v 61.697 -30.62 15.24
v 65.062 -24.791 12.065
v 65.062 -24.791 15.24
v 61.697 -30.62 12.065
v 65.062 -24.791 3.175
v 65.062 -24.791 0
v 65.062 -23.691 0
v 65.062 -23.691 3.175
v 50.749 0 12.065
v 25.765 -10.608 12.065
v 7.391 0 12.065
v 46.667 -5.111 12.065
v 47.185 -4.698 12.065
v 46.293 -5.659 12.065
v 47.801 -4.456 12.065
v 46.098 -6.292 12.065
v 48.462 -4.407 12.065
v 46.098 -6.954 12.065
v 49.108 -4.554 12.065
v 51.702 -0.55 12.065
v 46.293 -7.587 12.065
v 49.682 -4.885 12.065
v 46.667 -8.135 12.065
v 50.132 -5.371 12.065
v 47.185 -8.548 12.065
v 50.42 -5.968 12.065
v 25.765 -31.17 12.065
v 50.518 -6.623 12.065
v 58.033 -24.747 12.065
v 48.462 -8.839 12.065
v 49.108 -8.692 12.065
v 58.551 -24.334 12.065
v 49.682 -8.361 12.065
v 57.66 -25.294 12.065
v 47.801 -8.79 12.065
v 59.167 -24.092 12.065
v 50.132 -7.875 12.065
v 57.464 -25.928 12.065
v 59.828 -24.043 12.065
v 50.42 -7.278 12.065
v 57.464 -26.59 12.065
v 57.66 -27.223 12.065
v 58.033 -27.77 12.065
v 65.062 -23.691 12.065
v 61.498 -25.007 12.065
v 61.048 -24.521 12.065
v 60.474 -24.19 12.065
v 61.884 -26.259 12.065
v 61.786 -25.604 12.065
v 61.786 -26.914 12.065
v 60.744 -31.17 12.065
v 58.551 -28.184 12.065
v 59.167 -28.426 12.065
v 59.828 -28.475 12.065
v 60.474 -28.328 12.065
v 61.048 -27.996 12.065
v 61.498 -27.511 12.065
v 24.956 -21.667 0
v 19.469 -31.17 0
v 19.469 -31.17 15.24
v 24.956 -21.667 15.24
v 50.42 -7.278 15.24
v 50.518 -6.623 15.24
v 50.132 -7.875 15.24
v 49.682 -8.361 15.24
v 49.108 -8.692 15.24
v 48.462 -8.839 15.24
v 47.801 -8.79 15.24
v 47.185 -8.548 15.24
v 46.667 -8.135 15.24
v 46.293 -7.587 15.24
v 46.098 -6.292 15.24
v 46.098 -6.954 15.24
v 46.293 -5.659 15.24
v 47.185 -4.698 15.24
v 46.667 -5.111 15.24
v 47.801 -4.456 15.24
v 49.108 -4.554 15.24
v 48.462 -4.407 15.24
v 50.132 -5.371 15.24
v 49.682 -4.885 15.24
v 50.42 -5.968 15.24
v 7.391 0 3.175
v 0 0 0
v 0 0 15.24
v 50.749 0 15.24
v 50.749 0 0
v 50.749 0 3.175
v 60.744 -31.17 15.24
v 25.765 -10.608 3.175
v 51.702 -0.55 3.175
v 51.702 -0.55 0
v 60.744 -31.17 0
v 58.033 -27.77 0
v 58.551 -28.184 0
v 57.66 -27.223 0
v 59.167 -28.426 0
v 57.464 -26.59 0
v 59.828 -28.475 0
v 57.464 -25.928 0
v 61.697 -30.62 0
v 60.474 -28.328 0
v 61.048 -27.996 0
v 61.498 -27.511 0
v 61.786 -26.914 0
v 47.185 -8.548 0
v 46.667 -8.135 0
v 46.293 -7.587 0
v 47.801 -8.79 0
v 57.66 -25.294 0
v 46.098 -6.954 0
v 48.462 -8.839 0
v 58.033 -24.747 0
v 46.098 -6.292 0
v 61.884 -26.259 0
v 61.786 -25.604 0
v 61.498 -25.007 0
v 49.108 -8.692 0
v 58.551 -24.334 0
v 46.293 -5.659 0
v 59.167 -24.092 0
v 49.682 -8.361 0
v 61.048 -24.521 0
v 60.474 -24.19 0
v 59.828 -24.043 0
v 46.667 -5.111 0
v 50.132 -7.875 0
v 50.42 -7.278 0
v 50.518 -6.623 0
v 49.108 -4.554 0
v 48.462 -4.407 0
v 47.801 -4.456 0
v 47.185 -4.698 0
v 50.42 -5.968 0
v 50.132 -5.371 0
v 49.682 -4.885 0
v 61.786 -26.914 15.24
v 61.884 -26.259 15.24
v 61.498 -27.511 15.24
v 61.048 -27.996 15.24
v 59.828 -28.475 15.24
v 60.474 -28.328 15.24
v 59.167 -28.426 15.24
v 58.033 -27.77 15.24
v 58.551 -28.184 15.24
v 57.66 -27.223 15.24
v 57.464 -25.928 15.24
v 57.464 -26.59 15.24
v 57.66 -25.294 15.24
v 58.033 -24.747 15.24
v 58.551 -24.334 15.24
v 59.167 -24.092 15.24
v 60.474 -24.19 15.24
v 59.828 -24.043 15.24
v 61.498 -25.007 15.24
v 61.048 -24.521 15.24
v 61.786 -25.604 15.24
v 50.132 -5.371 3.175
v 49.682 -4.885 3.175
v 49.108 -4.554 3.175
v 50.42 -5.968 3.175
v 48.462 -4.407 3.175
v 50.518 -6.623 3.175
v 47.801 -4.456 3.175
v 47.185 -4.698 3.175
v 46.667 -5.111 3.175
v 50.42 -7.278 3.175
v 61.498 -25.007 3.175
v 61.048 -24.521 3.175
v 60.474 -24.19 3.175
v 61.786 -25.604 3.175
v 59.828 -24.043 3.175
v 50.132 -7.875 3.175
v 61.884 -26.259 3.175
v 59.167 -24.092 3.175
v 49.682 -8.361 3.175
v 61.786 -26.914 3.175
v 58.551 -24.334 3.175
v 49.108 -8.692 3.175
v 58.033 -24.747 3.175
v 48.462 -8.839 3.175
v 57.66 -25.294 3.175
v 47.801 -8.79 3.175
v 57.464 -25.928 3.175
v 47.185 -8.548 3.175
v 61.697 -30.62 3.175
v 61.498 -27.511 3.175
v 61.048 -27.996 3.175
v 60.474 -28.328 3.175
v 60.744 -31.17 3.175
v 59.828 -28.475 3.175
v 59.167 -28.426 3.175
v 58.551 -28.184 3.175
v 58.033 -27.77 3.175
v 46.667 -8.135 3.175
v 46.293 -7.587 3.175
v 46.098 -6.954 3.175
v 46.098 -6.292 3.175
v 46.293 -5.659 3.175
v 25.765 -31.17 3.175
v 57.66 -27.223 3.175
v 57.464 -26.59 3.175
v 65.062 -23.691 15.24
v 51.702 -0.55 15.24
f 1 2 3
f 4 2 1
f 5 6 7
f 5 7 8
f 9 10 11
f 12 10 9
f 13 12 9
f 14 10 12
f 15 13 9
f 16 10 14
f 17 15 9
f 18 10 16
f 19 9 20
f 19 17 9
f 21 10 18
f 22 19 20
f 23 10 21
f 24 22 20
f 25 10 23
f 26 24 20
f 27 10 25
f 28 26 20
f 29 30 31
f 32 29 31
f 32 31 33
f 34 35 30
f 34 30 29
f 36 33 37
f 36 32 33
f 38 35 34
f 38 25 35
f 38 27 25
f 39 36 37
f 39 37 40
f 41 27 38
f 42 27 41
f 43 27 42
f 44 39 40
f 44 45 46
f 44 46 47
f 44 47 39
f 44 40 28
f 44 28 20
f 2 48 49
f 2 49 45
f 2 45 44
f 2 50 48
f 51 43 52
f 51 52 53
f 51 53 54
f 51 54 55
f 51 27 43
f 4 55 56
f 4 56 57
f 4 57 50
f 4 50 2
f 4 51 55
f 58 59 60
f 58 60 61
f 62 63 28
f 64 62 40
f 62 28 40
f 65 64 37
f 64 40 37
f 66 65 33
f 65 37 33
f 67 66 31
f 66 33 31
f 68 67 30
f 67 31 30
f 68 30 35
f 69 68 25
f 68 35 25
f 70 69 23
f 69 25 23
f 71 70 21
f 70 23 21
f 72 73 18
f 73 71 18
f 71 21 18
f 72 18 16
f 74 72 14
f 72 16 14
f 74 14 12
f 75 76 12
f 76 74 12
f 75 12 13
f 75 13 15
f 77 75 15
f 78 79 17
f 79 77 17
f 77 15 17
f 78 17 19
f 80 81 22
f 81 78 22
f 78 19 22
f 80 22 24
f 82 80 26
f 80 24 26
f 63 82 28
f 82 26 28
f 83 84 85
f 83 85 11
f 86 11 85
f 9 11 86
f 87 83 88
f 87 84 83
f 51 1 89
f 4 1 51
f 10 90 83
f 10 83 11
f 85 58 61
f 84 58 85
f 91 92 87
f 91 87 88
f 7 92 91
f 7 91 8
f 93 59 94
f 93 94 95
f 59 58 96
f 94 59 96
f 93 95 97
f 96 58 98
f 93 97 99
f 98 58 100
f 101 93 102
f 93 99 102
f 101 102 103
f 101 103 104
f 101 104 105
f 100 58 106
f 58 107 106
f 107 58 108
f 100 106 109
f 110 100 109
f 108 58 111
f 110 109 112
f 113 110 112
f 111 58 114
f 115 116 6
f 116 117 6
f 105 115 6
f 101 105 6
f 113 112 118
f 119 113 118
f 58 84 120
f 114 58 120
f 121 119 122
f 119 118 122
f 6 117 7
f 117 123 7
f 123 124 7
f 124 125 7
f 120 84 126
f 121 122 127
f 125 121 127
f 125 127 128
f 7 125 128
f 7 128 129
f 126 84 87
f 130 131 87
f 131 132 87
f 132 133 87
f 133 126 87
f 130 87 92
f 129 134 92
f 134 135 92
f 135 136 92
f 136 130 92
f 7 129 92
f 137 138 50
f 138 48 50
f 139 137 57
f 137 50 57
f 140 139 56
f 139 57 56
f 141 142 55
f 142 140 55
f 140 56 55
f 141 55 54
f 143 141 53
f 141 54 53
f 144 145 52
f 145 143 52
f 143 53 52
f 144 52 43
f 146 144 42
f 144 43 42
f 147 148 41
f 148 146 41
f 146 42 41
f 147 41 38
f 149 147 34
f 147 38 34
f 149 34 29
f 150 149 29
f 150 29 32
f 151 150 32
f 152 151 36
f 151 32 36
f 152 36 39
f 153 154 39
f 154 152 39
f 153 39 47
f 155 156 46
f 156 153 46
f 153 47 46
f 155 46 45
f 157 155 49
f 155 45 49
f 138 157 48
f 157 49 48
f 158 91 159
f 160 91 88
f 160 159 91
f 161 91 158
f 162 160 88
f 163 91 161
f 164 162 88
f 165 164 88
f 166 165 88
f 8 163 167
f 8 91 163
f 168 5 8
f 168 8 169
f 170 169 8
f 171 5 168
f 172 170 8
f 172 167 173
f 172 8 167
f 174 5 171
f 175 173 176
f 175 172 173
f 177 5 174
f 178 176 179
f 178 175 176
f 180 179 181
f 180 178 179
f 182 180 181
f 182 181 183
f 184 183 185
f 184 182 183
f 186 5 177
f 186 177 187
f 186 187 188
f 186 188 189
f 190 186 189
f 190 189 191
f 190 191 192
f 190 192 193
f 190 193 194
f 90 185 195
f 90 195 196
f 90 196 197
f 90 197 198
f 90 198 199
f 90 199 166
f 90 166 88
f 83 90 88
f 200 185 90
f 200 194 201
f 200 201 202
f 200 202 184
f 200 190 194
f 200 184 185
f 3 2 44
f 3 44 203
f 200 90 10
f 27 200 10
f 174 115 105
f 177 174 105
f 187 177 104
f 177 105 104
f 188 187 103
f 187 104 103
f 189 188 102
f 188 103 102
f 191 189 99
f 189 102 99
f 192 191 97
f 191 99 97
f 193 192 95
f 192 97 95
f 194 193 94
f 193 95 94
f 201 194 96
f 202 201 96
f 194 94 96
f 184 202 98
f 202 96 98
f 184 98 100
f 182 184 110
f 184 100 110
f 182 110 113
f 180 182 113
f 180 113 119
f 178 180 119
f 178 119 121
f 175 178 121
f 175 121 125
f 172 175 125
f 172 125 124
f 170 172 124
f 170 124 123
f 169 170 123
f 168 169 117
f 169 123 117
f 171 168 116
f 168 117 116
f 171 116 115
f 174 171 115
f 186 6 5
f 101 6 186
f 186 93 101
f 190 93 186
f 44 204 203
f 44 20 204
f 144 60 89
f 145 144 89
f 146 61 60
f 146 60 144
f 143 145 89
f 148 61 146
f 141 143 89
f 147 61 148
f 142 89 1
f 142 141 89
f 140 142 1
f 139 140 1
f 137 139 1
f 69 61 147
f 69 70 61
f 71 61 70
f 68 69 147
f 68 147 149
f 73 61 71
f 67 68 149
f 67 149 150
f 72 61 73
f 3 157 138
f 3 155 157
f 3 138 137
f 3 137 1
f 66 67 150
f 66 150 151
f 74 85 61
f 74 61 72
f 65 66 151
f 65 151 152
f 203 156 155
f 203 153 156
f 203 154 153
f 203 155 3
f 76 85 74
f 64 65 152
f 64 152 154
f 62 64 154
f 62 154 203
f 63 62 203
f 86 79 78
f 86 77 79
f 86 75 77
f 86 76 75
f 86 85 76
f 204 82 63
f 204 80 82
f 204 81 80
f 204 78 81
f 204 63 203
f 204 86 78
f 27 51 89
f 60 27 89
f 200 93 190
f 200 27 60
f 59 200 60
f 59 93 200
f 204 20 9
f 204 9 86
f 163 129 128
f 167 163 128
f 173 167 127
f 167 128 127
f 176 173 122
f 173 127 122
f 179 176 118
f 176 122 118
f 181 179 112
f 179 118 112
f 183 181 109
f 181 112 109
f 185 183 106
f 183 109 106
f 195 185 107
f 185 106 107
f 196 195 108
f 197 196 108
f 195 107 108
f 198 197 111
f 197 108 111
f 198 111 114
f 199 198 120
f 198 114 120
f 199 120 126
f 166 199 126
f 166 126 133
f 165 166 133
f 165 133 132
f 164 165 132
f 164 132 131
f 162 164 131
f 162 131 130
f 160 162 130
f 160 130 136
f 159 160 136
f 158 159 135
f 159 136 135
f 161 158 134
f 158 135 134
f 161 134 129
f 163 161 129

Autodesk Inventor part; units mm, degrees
ref_plane "YZ Plane" through (0, 0, 0) normal (1, 0, 0) x (0, 1, 0)
ref_plane "XZ Plane" through (0, 0, 0) normal (0, 1, 0) x (-1, 0, 0)
ref_plane "XY Plane" through (0, 0, 0) normal (0, 0, 1) x (1, 0, 0)
sketch "Sketch2" plane through (0, 0, 0) normal (0, 0, 1) x (1, 0, 0)
  line L0 (0, 0) -> (51.3842, 0)
  line L1 (51.3842, 0) -> (65.3796, -24.2407)
  line L2 (65.3796, -24.2407) -> (61.3791, -31.1698)
  line L3 (65.3796, -24.2407) -> (73.3806, -24.2407) construction
  line L4 (61.3791, -31.1698) -> (19.4691, -31.1698)
  line L5 (19.4691, -31.1698) -> (24.9555, -21.6671)
  line L6 (19.4691, -31.1698) -> (30.4419, -31.1698) construction
  line L7 (24.9555, -21.6671) -> (0, 0)
  line L8 (51.3842, 0) -> (58.6918, 0) construction
  line L9 (48.8733, -7.5723) -> (70.4506, -7.5723) construction
  circle A0 centre (48.2959, -6.6229) radius 2.2225
  circle A1 centre (59.662, -26.2588) radius 2.2225
  dimension "d0" = 51.3842
  dimension "d1" = 27.9908
  dimension "d2" = 120
  dimension "d3" = 8.001
  dimension "d4" = 120
  dimension "d5" = 41.91
  dimension "d6" = 10.9728
  dimension "d7" = 60
  dimension "d15" = 4.445
  dimension "d16" = 4.445
extrude "Extrusion1" add sketch "Sketch2" along normal blind 15.24
sketch "Sketch3" plane through (65.3796, -24.2407, 15.24) normal (0.866, -0.5, 0) x (0, 0, -1)
  point P0 (15.24, -11.6967)
sketch "Sketch4" plane through (65.3796, -24.2407, 15.24) normal (0.866, -0.5, 0) x (0, 0, -1)
  line L0 (15.24, -8.001) -> (0, -8.001) projected
  line L1 (0, -8.001) -> (3.175, -8.001)
  line L2 (15.24, 0) -> (0, 0) projected
  line L3 (3.175, -8.001) -> (12.065, -8.001)
  line L4 (12.065, -8.001) -> (12.065, 0)
  line L5 (12.065, 0) -> (3.175, 0)
  line L6 (3.175, 0) -> (3.175, -8.001)
  point P0 (15.24, -11.6967)
  point P1 (3.175, 0)
  point P2 (12.065, -8.001)
  dimension "d19" = 3.175
  dimension "d20" = 8.89
sketch "Sketch5" plane through (19.4691, -31.1698, 0) normal (0, -1, 0) x (1, 0, 0)
  point P0 (-19.4691, 0)
extrude "Extrusion2" cut sketch "Sketch4" against normal blind 127
sketch "Sketch6" plane through (19.4691, -31.1698, 0) normal (0, -1, 0) x (1, 0, 0)
  point P0 (-19.4691, 0)
sketch "Sketch7" plane through (19.4691, -31.1698, 0) normal (0, -1, 0) x (1, 0, 0)
  line L0 (0, 0) -> (41.91, 0) projected
  line L1 (41.91, 3.175) -> (41.91, 12.065) projected
  line L2 (41.91, 0) -> (41.91, 3.175)
  line L3 (41.91, 12.065) -> (-12.0777, 12.065) projected
  line L4 (41.91, 3.175) -> (5.08, 3.175)
  line L5 (5.08, 12.065) -> (41.91, 12.065)
  line L6 (41.91, 12.065) -> (41.91, 3.175)
  line L7 (6.7536, 12.065) -> (6.7536, 3.175)
  line L8 (41.91, 3.175) -> (-12.0777, 3.175) projected
  point P0 (-19.4691, 0)
  dimension "d23" = 36.83
extrude "Extrusion3" [suppressed]
sketch "Sketch8" plane through (0, 0, 0) normal (0, 1, 0) x (1, 0, 0)
  line L0 (65.3796, -3.175) -> (23.3934, -3.175) projected
  line L1 (24.5491, -3.175) -> (23.3934, -3.175)
  line L2 (23.3934, -12.065) -> (7.3914, -12.065) projected
  line L3 (24.5491, -3.175) -> (23.3934, -3.175)
  line L4 (23.3934, -3.175) -> (23.3934, -12.065)
  line L5 (23.3934, -12.065) -> (24.5491, -12.065)
  line L6 (24.5491, -12.065) -> (24.5491, -3.175)
  point P0 (0, 0)
extrude "Extrusion4" cut sketch "Sketch8" along normal mid plane 15.24
sketch "Sketch9" plane through (61.3791, -21.9311, 3.175) normal (-1, 0, 0) x (0, 0, 1)
  point P0 (-3.175, 21.9311)
sketch "Sketch10" plane through (65.3796, -24.2407, 12.065) normal (0.866, 0.5, 0) x (0, 0, -1)
  line L0 (8.89, 0) -> (0, 0) projected
  line L1 (8.89, 4.0005) -> (8.89, 8.001) projected
  line L2 (0, 0) -> (8.89, 0)
  line L3 (8.89, 0) -> (8.89, 8.001)
  line L4 (8.89, 8.001) -> (0, 8.001)
  line L5 (0, 8.001) -> (0, 0)
  point P0 (12.065, 53.6829)
extrude "Extrusion5" cut sketch "Sketch10" against normal blind 15.24
sketch "Sketch11" plane through (19.4691, -31.1698, 0) normal (0, -1, 0) x (1, 0, 0)
  line L0 (42.4154, 3.175) -> (37.9704, 3.175) projected
  line L1 (42.4154, 3.175) -> (6.2959, 3.175)
  line L2 (6.2959, 3.175) -> (6.2959, 12.065)
  line L3 (6.2959, 12.065) -> (42.4154, 12.065)
  line L4 (42.4154, 12.065) -> (42.4154, 3.175)
  point P0 (-19.4691, 0)
extrude "Extrusion6" cut sketch "Sketch11" against normal blind 127
sketch "Sketch12" plane through (24.5491, 0, 3.175) normal (-1, 0, 0) x (0, 0, 1)
  point P0 (-3.175, 0)
sketch "Sketch13" plane through (0, 0, 0) normal (0, 1, 0) x (1, 0, 0)
  line L0 (25.765, -3.175) -> (24.5491, -3.175) projected
  line L1 (25.765, -3.175) -> (25.765, -12.065) projected
  line L2 (24.5491, -3.175) -> (25.765, -3.175)
  line L3 (25.765, -3.175) -> (25.765, -12.065)
  line L4 (25.765, -12.065) -> (24.5491, -12.065)
  line L5 (24.5491, -12.065) -> (24.5491, -3.175)
  point P0 (0, 0)
extrude "Extrusion7" cut sketch "Sketch13" against normal blind 2.54
chamfer "Chamfer1" distance 0.635 angle 45 6 edges at (61.3791, -31.1698, 13.6525) (65.3796, -24.2407, 13.6525) (65.3796, -24.2407, 1.5875) (61.3791, -31.1698, 1.5875) (51.3842, 0, 13.6525) (51.3842, 0, 1.5875)
properties part number "Non Colour Claw" material "Iron, Gray"
